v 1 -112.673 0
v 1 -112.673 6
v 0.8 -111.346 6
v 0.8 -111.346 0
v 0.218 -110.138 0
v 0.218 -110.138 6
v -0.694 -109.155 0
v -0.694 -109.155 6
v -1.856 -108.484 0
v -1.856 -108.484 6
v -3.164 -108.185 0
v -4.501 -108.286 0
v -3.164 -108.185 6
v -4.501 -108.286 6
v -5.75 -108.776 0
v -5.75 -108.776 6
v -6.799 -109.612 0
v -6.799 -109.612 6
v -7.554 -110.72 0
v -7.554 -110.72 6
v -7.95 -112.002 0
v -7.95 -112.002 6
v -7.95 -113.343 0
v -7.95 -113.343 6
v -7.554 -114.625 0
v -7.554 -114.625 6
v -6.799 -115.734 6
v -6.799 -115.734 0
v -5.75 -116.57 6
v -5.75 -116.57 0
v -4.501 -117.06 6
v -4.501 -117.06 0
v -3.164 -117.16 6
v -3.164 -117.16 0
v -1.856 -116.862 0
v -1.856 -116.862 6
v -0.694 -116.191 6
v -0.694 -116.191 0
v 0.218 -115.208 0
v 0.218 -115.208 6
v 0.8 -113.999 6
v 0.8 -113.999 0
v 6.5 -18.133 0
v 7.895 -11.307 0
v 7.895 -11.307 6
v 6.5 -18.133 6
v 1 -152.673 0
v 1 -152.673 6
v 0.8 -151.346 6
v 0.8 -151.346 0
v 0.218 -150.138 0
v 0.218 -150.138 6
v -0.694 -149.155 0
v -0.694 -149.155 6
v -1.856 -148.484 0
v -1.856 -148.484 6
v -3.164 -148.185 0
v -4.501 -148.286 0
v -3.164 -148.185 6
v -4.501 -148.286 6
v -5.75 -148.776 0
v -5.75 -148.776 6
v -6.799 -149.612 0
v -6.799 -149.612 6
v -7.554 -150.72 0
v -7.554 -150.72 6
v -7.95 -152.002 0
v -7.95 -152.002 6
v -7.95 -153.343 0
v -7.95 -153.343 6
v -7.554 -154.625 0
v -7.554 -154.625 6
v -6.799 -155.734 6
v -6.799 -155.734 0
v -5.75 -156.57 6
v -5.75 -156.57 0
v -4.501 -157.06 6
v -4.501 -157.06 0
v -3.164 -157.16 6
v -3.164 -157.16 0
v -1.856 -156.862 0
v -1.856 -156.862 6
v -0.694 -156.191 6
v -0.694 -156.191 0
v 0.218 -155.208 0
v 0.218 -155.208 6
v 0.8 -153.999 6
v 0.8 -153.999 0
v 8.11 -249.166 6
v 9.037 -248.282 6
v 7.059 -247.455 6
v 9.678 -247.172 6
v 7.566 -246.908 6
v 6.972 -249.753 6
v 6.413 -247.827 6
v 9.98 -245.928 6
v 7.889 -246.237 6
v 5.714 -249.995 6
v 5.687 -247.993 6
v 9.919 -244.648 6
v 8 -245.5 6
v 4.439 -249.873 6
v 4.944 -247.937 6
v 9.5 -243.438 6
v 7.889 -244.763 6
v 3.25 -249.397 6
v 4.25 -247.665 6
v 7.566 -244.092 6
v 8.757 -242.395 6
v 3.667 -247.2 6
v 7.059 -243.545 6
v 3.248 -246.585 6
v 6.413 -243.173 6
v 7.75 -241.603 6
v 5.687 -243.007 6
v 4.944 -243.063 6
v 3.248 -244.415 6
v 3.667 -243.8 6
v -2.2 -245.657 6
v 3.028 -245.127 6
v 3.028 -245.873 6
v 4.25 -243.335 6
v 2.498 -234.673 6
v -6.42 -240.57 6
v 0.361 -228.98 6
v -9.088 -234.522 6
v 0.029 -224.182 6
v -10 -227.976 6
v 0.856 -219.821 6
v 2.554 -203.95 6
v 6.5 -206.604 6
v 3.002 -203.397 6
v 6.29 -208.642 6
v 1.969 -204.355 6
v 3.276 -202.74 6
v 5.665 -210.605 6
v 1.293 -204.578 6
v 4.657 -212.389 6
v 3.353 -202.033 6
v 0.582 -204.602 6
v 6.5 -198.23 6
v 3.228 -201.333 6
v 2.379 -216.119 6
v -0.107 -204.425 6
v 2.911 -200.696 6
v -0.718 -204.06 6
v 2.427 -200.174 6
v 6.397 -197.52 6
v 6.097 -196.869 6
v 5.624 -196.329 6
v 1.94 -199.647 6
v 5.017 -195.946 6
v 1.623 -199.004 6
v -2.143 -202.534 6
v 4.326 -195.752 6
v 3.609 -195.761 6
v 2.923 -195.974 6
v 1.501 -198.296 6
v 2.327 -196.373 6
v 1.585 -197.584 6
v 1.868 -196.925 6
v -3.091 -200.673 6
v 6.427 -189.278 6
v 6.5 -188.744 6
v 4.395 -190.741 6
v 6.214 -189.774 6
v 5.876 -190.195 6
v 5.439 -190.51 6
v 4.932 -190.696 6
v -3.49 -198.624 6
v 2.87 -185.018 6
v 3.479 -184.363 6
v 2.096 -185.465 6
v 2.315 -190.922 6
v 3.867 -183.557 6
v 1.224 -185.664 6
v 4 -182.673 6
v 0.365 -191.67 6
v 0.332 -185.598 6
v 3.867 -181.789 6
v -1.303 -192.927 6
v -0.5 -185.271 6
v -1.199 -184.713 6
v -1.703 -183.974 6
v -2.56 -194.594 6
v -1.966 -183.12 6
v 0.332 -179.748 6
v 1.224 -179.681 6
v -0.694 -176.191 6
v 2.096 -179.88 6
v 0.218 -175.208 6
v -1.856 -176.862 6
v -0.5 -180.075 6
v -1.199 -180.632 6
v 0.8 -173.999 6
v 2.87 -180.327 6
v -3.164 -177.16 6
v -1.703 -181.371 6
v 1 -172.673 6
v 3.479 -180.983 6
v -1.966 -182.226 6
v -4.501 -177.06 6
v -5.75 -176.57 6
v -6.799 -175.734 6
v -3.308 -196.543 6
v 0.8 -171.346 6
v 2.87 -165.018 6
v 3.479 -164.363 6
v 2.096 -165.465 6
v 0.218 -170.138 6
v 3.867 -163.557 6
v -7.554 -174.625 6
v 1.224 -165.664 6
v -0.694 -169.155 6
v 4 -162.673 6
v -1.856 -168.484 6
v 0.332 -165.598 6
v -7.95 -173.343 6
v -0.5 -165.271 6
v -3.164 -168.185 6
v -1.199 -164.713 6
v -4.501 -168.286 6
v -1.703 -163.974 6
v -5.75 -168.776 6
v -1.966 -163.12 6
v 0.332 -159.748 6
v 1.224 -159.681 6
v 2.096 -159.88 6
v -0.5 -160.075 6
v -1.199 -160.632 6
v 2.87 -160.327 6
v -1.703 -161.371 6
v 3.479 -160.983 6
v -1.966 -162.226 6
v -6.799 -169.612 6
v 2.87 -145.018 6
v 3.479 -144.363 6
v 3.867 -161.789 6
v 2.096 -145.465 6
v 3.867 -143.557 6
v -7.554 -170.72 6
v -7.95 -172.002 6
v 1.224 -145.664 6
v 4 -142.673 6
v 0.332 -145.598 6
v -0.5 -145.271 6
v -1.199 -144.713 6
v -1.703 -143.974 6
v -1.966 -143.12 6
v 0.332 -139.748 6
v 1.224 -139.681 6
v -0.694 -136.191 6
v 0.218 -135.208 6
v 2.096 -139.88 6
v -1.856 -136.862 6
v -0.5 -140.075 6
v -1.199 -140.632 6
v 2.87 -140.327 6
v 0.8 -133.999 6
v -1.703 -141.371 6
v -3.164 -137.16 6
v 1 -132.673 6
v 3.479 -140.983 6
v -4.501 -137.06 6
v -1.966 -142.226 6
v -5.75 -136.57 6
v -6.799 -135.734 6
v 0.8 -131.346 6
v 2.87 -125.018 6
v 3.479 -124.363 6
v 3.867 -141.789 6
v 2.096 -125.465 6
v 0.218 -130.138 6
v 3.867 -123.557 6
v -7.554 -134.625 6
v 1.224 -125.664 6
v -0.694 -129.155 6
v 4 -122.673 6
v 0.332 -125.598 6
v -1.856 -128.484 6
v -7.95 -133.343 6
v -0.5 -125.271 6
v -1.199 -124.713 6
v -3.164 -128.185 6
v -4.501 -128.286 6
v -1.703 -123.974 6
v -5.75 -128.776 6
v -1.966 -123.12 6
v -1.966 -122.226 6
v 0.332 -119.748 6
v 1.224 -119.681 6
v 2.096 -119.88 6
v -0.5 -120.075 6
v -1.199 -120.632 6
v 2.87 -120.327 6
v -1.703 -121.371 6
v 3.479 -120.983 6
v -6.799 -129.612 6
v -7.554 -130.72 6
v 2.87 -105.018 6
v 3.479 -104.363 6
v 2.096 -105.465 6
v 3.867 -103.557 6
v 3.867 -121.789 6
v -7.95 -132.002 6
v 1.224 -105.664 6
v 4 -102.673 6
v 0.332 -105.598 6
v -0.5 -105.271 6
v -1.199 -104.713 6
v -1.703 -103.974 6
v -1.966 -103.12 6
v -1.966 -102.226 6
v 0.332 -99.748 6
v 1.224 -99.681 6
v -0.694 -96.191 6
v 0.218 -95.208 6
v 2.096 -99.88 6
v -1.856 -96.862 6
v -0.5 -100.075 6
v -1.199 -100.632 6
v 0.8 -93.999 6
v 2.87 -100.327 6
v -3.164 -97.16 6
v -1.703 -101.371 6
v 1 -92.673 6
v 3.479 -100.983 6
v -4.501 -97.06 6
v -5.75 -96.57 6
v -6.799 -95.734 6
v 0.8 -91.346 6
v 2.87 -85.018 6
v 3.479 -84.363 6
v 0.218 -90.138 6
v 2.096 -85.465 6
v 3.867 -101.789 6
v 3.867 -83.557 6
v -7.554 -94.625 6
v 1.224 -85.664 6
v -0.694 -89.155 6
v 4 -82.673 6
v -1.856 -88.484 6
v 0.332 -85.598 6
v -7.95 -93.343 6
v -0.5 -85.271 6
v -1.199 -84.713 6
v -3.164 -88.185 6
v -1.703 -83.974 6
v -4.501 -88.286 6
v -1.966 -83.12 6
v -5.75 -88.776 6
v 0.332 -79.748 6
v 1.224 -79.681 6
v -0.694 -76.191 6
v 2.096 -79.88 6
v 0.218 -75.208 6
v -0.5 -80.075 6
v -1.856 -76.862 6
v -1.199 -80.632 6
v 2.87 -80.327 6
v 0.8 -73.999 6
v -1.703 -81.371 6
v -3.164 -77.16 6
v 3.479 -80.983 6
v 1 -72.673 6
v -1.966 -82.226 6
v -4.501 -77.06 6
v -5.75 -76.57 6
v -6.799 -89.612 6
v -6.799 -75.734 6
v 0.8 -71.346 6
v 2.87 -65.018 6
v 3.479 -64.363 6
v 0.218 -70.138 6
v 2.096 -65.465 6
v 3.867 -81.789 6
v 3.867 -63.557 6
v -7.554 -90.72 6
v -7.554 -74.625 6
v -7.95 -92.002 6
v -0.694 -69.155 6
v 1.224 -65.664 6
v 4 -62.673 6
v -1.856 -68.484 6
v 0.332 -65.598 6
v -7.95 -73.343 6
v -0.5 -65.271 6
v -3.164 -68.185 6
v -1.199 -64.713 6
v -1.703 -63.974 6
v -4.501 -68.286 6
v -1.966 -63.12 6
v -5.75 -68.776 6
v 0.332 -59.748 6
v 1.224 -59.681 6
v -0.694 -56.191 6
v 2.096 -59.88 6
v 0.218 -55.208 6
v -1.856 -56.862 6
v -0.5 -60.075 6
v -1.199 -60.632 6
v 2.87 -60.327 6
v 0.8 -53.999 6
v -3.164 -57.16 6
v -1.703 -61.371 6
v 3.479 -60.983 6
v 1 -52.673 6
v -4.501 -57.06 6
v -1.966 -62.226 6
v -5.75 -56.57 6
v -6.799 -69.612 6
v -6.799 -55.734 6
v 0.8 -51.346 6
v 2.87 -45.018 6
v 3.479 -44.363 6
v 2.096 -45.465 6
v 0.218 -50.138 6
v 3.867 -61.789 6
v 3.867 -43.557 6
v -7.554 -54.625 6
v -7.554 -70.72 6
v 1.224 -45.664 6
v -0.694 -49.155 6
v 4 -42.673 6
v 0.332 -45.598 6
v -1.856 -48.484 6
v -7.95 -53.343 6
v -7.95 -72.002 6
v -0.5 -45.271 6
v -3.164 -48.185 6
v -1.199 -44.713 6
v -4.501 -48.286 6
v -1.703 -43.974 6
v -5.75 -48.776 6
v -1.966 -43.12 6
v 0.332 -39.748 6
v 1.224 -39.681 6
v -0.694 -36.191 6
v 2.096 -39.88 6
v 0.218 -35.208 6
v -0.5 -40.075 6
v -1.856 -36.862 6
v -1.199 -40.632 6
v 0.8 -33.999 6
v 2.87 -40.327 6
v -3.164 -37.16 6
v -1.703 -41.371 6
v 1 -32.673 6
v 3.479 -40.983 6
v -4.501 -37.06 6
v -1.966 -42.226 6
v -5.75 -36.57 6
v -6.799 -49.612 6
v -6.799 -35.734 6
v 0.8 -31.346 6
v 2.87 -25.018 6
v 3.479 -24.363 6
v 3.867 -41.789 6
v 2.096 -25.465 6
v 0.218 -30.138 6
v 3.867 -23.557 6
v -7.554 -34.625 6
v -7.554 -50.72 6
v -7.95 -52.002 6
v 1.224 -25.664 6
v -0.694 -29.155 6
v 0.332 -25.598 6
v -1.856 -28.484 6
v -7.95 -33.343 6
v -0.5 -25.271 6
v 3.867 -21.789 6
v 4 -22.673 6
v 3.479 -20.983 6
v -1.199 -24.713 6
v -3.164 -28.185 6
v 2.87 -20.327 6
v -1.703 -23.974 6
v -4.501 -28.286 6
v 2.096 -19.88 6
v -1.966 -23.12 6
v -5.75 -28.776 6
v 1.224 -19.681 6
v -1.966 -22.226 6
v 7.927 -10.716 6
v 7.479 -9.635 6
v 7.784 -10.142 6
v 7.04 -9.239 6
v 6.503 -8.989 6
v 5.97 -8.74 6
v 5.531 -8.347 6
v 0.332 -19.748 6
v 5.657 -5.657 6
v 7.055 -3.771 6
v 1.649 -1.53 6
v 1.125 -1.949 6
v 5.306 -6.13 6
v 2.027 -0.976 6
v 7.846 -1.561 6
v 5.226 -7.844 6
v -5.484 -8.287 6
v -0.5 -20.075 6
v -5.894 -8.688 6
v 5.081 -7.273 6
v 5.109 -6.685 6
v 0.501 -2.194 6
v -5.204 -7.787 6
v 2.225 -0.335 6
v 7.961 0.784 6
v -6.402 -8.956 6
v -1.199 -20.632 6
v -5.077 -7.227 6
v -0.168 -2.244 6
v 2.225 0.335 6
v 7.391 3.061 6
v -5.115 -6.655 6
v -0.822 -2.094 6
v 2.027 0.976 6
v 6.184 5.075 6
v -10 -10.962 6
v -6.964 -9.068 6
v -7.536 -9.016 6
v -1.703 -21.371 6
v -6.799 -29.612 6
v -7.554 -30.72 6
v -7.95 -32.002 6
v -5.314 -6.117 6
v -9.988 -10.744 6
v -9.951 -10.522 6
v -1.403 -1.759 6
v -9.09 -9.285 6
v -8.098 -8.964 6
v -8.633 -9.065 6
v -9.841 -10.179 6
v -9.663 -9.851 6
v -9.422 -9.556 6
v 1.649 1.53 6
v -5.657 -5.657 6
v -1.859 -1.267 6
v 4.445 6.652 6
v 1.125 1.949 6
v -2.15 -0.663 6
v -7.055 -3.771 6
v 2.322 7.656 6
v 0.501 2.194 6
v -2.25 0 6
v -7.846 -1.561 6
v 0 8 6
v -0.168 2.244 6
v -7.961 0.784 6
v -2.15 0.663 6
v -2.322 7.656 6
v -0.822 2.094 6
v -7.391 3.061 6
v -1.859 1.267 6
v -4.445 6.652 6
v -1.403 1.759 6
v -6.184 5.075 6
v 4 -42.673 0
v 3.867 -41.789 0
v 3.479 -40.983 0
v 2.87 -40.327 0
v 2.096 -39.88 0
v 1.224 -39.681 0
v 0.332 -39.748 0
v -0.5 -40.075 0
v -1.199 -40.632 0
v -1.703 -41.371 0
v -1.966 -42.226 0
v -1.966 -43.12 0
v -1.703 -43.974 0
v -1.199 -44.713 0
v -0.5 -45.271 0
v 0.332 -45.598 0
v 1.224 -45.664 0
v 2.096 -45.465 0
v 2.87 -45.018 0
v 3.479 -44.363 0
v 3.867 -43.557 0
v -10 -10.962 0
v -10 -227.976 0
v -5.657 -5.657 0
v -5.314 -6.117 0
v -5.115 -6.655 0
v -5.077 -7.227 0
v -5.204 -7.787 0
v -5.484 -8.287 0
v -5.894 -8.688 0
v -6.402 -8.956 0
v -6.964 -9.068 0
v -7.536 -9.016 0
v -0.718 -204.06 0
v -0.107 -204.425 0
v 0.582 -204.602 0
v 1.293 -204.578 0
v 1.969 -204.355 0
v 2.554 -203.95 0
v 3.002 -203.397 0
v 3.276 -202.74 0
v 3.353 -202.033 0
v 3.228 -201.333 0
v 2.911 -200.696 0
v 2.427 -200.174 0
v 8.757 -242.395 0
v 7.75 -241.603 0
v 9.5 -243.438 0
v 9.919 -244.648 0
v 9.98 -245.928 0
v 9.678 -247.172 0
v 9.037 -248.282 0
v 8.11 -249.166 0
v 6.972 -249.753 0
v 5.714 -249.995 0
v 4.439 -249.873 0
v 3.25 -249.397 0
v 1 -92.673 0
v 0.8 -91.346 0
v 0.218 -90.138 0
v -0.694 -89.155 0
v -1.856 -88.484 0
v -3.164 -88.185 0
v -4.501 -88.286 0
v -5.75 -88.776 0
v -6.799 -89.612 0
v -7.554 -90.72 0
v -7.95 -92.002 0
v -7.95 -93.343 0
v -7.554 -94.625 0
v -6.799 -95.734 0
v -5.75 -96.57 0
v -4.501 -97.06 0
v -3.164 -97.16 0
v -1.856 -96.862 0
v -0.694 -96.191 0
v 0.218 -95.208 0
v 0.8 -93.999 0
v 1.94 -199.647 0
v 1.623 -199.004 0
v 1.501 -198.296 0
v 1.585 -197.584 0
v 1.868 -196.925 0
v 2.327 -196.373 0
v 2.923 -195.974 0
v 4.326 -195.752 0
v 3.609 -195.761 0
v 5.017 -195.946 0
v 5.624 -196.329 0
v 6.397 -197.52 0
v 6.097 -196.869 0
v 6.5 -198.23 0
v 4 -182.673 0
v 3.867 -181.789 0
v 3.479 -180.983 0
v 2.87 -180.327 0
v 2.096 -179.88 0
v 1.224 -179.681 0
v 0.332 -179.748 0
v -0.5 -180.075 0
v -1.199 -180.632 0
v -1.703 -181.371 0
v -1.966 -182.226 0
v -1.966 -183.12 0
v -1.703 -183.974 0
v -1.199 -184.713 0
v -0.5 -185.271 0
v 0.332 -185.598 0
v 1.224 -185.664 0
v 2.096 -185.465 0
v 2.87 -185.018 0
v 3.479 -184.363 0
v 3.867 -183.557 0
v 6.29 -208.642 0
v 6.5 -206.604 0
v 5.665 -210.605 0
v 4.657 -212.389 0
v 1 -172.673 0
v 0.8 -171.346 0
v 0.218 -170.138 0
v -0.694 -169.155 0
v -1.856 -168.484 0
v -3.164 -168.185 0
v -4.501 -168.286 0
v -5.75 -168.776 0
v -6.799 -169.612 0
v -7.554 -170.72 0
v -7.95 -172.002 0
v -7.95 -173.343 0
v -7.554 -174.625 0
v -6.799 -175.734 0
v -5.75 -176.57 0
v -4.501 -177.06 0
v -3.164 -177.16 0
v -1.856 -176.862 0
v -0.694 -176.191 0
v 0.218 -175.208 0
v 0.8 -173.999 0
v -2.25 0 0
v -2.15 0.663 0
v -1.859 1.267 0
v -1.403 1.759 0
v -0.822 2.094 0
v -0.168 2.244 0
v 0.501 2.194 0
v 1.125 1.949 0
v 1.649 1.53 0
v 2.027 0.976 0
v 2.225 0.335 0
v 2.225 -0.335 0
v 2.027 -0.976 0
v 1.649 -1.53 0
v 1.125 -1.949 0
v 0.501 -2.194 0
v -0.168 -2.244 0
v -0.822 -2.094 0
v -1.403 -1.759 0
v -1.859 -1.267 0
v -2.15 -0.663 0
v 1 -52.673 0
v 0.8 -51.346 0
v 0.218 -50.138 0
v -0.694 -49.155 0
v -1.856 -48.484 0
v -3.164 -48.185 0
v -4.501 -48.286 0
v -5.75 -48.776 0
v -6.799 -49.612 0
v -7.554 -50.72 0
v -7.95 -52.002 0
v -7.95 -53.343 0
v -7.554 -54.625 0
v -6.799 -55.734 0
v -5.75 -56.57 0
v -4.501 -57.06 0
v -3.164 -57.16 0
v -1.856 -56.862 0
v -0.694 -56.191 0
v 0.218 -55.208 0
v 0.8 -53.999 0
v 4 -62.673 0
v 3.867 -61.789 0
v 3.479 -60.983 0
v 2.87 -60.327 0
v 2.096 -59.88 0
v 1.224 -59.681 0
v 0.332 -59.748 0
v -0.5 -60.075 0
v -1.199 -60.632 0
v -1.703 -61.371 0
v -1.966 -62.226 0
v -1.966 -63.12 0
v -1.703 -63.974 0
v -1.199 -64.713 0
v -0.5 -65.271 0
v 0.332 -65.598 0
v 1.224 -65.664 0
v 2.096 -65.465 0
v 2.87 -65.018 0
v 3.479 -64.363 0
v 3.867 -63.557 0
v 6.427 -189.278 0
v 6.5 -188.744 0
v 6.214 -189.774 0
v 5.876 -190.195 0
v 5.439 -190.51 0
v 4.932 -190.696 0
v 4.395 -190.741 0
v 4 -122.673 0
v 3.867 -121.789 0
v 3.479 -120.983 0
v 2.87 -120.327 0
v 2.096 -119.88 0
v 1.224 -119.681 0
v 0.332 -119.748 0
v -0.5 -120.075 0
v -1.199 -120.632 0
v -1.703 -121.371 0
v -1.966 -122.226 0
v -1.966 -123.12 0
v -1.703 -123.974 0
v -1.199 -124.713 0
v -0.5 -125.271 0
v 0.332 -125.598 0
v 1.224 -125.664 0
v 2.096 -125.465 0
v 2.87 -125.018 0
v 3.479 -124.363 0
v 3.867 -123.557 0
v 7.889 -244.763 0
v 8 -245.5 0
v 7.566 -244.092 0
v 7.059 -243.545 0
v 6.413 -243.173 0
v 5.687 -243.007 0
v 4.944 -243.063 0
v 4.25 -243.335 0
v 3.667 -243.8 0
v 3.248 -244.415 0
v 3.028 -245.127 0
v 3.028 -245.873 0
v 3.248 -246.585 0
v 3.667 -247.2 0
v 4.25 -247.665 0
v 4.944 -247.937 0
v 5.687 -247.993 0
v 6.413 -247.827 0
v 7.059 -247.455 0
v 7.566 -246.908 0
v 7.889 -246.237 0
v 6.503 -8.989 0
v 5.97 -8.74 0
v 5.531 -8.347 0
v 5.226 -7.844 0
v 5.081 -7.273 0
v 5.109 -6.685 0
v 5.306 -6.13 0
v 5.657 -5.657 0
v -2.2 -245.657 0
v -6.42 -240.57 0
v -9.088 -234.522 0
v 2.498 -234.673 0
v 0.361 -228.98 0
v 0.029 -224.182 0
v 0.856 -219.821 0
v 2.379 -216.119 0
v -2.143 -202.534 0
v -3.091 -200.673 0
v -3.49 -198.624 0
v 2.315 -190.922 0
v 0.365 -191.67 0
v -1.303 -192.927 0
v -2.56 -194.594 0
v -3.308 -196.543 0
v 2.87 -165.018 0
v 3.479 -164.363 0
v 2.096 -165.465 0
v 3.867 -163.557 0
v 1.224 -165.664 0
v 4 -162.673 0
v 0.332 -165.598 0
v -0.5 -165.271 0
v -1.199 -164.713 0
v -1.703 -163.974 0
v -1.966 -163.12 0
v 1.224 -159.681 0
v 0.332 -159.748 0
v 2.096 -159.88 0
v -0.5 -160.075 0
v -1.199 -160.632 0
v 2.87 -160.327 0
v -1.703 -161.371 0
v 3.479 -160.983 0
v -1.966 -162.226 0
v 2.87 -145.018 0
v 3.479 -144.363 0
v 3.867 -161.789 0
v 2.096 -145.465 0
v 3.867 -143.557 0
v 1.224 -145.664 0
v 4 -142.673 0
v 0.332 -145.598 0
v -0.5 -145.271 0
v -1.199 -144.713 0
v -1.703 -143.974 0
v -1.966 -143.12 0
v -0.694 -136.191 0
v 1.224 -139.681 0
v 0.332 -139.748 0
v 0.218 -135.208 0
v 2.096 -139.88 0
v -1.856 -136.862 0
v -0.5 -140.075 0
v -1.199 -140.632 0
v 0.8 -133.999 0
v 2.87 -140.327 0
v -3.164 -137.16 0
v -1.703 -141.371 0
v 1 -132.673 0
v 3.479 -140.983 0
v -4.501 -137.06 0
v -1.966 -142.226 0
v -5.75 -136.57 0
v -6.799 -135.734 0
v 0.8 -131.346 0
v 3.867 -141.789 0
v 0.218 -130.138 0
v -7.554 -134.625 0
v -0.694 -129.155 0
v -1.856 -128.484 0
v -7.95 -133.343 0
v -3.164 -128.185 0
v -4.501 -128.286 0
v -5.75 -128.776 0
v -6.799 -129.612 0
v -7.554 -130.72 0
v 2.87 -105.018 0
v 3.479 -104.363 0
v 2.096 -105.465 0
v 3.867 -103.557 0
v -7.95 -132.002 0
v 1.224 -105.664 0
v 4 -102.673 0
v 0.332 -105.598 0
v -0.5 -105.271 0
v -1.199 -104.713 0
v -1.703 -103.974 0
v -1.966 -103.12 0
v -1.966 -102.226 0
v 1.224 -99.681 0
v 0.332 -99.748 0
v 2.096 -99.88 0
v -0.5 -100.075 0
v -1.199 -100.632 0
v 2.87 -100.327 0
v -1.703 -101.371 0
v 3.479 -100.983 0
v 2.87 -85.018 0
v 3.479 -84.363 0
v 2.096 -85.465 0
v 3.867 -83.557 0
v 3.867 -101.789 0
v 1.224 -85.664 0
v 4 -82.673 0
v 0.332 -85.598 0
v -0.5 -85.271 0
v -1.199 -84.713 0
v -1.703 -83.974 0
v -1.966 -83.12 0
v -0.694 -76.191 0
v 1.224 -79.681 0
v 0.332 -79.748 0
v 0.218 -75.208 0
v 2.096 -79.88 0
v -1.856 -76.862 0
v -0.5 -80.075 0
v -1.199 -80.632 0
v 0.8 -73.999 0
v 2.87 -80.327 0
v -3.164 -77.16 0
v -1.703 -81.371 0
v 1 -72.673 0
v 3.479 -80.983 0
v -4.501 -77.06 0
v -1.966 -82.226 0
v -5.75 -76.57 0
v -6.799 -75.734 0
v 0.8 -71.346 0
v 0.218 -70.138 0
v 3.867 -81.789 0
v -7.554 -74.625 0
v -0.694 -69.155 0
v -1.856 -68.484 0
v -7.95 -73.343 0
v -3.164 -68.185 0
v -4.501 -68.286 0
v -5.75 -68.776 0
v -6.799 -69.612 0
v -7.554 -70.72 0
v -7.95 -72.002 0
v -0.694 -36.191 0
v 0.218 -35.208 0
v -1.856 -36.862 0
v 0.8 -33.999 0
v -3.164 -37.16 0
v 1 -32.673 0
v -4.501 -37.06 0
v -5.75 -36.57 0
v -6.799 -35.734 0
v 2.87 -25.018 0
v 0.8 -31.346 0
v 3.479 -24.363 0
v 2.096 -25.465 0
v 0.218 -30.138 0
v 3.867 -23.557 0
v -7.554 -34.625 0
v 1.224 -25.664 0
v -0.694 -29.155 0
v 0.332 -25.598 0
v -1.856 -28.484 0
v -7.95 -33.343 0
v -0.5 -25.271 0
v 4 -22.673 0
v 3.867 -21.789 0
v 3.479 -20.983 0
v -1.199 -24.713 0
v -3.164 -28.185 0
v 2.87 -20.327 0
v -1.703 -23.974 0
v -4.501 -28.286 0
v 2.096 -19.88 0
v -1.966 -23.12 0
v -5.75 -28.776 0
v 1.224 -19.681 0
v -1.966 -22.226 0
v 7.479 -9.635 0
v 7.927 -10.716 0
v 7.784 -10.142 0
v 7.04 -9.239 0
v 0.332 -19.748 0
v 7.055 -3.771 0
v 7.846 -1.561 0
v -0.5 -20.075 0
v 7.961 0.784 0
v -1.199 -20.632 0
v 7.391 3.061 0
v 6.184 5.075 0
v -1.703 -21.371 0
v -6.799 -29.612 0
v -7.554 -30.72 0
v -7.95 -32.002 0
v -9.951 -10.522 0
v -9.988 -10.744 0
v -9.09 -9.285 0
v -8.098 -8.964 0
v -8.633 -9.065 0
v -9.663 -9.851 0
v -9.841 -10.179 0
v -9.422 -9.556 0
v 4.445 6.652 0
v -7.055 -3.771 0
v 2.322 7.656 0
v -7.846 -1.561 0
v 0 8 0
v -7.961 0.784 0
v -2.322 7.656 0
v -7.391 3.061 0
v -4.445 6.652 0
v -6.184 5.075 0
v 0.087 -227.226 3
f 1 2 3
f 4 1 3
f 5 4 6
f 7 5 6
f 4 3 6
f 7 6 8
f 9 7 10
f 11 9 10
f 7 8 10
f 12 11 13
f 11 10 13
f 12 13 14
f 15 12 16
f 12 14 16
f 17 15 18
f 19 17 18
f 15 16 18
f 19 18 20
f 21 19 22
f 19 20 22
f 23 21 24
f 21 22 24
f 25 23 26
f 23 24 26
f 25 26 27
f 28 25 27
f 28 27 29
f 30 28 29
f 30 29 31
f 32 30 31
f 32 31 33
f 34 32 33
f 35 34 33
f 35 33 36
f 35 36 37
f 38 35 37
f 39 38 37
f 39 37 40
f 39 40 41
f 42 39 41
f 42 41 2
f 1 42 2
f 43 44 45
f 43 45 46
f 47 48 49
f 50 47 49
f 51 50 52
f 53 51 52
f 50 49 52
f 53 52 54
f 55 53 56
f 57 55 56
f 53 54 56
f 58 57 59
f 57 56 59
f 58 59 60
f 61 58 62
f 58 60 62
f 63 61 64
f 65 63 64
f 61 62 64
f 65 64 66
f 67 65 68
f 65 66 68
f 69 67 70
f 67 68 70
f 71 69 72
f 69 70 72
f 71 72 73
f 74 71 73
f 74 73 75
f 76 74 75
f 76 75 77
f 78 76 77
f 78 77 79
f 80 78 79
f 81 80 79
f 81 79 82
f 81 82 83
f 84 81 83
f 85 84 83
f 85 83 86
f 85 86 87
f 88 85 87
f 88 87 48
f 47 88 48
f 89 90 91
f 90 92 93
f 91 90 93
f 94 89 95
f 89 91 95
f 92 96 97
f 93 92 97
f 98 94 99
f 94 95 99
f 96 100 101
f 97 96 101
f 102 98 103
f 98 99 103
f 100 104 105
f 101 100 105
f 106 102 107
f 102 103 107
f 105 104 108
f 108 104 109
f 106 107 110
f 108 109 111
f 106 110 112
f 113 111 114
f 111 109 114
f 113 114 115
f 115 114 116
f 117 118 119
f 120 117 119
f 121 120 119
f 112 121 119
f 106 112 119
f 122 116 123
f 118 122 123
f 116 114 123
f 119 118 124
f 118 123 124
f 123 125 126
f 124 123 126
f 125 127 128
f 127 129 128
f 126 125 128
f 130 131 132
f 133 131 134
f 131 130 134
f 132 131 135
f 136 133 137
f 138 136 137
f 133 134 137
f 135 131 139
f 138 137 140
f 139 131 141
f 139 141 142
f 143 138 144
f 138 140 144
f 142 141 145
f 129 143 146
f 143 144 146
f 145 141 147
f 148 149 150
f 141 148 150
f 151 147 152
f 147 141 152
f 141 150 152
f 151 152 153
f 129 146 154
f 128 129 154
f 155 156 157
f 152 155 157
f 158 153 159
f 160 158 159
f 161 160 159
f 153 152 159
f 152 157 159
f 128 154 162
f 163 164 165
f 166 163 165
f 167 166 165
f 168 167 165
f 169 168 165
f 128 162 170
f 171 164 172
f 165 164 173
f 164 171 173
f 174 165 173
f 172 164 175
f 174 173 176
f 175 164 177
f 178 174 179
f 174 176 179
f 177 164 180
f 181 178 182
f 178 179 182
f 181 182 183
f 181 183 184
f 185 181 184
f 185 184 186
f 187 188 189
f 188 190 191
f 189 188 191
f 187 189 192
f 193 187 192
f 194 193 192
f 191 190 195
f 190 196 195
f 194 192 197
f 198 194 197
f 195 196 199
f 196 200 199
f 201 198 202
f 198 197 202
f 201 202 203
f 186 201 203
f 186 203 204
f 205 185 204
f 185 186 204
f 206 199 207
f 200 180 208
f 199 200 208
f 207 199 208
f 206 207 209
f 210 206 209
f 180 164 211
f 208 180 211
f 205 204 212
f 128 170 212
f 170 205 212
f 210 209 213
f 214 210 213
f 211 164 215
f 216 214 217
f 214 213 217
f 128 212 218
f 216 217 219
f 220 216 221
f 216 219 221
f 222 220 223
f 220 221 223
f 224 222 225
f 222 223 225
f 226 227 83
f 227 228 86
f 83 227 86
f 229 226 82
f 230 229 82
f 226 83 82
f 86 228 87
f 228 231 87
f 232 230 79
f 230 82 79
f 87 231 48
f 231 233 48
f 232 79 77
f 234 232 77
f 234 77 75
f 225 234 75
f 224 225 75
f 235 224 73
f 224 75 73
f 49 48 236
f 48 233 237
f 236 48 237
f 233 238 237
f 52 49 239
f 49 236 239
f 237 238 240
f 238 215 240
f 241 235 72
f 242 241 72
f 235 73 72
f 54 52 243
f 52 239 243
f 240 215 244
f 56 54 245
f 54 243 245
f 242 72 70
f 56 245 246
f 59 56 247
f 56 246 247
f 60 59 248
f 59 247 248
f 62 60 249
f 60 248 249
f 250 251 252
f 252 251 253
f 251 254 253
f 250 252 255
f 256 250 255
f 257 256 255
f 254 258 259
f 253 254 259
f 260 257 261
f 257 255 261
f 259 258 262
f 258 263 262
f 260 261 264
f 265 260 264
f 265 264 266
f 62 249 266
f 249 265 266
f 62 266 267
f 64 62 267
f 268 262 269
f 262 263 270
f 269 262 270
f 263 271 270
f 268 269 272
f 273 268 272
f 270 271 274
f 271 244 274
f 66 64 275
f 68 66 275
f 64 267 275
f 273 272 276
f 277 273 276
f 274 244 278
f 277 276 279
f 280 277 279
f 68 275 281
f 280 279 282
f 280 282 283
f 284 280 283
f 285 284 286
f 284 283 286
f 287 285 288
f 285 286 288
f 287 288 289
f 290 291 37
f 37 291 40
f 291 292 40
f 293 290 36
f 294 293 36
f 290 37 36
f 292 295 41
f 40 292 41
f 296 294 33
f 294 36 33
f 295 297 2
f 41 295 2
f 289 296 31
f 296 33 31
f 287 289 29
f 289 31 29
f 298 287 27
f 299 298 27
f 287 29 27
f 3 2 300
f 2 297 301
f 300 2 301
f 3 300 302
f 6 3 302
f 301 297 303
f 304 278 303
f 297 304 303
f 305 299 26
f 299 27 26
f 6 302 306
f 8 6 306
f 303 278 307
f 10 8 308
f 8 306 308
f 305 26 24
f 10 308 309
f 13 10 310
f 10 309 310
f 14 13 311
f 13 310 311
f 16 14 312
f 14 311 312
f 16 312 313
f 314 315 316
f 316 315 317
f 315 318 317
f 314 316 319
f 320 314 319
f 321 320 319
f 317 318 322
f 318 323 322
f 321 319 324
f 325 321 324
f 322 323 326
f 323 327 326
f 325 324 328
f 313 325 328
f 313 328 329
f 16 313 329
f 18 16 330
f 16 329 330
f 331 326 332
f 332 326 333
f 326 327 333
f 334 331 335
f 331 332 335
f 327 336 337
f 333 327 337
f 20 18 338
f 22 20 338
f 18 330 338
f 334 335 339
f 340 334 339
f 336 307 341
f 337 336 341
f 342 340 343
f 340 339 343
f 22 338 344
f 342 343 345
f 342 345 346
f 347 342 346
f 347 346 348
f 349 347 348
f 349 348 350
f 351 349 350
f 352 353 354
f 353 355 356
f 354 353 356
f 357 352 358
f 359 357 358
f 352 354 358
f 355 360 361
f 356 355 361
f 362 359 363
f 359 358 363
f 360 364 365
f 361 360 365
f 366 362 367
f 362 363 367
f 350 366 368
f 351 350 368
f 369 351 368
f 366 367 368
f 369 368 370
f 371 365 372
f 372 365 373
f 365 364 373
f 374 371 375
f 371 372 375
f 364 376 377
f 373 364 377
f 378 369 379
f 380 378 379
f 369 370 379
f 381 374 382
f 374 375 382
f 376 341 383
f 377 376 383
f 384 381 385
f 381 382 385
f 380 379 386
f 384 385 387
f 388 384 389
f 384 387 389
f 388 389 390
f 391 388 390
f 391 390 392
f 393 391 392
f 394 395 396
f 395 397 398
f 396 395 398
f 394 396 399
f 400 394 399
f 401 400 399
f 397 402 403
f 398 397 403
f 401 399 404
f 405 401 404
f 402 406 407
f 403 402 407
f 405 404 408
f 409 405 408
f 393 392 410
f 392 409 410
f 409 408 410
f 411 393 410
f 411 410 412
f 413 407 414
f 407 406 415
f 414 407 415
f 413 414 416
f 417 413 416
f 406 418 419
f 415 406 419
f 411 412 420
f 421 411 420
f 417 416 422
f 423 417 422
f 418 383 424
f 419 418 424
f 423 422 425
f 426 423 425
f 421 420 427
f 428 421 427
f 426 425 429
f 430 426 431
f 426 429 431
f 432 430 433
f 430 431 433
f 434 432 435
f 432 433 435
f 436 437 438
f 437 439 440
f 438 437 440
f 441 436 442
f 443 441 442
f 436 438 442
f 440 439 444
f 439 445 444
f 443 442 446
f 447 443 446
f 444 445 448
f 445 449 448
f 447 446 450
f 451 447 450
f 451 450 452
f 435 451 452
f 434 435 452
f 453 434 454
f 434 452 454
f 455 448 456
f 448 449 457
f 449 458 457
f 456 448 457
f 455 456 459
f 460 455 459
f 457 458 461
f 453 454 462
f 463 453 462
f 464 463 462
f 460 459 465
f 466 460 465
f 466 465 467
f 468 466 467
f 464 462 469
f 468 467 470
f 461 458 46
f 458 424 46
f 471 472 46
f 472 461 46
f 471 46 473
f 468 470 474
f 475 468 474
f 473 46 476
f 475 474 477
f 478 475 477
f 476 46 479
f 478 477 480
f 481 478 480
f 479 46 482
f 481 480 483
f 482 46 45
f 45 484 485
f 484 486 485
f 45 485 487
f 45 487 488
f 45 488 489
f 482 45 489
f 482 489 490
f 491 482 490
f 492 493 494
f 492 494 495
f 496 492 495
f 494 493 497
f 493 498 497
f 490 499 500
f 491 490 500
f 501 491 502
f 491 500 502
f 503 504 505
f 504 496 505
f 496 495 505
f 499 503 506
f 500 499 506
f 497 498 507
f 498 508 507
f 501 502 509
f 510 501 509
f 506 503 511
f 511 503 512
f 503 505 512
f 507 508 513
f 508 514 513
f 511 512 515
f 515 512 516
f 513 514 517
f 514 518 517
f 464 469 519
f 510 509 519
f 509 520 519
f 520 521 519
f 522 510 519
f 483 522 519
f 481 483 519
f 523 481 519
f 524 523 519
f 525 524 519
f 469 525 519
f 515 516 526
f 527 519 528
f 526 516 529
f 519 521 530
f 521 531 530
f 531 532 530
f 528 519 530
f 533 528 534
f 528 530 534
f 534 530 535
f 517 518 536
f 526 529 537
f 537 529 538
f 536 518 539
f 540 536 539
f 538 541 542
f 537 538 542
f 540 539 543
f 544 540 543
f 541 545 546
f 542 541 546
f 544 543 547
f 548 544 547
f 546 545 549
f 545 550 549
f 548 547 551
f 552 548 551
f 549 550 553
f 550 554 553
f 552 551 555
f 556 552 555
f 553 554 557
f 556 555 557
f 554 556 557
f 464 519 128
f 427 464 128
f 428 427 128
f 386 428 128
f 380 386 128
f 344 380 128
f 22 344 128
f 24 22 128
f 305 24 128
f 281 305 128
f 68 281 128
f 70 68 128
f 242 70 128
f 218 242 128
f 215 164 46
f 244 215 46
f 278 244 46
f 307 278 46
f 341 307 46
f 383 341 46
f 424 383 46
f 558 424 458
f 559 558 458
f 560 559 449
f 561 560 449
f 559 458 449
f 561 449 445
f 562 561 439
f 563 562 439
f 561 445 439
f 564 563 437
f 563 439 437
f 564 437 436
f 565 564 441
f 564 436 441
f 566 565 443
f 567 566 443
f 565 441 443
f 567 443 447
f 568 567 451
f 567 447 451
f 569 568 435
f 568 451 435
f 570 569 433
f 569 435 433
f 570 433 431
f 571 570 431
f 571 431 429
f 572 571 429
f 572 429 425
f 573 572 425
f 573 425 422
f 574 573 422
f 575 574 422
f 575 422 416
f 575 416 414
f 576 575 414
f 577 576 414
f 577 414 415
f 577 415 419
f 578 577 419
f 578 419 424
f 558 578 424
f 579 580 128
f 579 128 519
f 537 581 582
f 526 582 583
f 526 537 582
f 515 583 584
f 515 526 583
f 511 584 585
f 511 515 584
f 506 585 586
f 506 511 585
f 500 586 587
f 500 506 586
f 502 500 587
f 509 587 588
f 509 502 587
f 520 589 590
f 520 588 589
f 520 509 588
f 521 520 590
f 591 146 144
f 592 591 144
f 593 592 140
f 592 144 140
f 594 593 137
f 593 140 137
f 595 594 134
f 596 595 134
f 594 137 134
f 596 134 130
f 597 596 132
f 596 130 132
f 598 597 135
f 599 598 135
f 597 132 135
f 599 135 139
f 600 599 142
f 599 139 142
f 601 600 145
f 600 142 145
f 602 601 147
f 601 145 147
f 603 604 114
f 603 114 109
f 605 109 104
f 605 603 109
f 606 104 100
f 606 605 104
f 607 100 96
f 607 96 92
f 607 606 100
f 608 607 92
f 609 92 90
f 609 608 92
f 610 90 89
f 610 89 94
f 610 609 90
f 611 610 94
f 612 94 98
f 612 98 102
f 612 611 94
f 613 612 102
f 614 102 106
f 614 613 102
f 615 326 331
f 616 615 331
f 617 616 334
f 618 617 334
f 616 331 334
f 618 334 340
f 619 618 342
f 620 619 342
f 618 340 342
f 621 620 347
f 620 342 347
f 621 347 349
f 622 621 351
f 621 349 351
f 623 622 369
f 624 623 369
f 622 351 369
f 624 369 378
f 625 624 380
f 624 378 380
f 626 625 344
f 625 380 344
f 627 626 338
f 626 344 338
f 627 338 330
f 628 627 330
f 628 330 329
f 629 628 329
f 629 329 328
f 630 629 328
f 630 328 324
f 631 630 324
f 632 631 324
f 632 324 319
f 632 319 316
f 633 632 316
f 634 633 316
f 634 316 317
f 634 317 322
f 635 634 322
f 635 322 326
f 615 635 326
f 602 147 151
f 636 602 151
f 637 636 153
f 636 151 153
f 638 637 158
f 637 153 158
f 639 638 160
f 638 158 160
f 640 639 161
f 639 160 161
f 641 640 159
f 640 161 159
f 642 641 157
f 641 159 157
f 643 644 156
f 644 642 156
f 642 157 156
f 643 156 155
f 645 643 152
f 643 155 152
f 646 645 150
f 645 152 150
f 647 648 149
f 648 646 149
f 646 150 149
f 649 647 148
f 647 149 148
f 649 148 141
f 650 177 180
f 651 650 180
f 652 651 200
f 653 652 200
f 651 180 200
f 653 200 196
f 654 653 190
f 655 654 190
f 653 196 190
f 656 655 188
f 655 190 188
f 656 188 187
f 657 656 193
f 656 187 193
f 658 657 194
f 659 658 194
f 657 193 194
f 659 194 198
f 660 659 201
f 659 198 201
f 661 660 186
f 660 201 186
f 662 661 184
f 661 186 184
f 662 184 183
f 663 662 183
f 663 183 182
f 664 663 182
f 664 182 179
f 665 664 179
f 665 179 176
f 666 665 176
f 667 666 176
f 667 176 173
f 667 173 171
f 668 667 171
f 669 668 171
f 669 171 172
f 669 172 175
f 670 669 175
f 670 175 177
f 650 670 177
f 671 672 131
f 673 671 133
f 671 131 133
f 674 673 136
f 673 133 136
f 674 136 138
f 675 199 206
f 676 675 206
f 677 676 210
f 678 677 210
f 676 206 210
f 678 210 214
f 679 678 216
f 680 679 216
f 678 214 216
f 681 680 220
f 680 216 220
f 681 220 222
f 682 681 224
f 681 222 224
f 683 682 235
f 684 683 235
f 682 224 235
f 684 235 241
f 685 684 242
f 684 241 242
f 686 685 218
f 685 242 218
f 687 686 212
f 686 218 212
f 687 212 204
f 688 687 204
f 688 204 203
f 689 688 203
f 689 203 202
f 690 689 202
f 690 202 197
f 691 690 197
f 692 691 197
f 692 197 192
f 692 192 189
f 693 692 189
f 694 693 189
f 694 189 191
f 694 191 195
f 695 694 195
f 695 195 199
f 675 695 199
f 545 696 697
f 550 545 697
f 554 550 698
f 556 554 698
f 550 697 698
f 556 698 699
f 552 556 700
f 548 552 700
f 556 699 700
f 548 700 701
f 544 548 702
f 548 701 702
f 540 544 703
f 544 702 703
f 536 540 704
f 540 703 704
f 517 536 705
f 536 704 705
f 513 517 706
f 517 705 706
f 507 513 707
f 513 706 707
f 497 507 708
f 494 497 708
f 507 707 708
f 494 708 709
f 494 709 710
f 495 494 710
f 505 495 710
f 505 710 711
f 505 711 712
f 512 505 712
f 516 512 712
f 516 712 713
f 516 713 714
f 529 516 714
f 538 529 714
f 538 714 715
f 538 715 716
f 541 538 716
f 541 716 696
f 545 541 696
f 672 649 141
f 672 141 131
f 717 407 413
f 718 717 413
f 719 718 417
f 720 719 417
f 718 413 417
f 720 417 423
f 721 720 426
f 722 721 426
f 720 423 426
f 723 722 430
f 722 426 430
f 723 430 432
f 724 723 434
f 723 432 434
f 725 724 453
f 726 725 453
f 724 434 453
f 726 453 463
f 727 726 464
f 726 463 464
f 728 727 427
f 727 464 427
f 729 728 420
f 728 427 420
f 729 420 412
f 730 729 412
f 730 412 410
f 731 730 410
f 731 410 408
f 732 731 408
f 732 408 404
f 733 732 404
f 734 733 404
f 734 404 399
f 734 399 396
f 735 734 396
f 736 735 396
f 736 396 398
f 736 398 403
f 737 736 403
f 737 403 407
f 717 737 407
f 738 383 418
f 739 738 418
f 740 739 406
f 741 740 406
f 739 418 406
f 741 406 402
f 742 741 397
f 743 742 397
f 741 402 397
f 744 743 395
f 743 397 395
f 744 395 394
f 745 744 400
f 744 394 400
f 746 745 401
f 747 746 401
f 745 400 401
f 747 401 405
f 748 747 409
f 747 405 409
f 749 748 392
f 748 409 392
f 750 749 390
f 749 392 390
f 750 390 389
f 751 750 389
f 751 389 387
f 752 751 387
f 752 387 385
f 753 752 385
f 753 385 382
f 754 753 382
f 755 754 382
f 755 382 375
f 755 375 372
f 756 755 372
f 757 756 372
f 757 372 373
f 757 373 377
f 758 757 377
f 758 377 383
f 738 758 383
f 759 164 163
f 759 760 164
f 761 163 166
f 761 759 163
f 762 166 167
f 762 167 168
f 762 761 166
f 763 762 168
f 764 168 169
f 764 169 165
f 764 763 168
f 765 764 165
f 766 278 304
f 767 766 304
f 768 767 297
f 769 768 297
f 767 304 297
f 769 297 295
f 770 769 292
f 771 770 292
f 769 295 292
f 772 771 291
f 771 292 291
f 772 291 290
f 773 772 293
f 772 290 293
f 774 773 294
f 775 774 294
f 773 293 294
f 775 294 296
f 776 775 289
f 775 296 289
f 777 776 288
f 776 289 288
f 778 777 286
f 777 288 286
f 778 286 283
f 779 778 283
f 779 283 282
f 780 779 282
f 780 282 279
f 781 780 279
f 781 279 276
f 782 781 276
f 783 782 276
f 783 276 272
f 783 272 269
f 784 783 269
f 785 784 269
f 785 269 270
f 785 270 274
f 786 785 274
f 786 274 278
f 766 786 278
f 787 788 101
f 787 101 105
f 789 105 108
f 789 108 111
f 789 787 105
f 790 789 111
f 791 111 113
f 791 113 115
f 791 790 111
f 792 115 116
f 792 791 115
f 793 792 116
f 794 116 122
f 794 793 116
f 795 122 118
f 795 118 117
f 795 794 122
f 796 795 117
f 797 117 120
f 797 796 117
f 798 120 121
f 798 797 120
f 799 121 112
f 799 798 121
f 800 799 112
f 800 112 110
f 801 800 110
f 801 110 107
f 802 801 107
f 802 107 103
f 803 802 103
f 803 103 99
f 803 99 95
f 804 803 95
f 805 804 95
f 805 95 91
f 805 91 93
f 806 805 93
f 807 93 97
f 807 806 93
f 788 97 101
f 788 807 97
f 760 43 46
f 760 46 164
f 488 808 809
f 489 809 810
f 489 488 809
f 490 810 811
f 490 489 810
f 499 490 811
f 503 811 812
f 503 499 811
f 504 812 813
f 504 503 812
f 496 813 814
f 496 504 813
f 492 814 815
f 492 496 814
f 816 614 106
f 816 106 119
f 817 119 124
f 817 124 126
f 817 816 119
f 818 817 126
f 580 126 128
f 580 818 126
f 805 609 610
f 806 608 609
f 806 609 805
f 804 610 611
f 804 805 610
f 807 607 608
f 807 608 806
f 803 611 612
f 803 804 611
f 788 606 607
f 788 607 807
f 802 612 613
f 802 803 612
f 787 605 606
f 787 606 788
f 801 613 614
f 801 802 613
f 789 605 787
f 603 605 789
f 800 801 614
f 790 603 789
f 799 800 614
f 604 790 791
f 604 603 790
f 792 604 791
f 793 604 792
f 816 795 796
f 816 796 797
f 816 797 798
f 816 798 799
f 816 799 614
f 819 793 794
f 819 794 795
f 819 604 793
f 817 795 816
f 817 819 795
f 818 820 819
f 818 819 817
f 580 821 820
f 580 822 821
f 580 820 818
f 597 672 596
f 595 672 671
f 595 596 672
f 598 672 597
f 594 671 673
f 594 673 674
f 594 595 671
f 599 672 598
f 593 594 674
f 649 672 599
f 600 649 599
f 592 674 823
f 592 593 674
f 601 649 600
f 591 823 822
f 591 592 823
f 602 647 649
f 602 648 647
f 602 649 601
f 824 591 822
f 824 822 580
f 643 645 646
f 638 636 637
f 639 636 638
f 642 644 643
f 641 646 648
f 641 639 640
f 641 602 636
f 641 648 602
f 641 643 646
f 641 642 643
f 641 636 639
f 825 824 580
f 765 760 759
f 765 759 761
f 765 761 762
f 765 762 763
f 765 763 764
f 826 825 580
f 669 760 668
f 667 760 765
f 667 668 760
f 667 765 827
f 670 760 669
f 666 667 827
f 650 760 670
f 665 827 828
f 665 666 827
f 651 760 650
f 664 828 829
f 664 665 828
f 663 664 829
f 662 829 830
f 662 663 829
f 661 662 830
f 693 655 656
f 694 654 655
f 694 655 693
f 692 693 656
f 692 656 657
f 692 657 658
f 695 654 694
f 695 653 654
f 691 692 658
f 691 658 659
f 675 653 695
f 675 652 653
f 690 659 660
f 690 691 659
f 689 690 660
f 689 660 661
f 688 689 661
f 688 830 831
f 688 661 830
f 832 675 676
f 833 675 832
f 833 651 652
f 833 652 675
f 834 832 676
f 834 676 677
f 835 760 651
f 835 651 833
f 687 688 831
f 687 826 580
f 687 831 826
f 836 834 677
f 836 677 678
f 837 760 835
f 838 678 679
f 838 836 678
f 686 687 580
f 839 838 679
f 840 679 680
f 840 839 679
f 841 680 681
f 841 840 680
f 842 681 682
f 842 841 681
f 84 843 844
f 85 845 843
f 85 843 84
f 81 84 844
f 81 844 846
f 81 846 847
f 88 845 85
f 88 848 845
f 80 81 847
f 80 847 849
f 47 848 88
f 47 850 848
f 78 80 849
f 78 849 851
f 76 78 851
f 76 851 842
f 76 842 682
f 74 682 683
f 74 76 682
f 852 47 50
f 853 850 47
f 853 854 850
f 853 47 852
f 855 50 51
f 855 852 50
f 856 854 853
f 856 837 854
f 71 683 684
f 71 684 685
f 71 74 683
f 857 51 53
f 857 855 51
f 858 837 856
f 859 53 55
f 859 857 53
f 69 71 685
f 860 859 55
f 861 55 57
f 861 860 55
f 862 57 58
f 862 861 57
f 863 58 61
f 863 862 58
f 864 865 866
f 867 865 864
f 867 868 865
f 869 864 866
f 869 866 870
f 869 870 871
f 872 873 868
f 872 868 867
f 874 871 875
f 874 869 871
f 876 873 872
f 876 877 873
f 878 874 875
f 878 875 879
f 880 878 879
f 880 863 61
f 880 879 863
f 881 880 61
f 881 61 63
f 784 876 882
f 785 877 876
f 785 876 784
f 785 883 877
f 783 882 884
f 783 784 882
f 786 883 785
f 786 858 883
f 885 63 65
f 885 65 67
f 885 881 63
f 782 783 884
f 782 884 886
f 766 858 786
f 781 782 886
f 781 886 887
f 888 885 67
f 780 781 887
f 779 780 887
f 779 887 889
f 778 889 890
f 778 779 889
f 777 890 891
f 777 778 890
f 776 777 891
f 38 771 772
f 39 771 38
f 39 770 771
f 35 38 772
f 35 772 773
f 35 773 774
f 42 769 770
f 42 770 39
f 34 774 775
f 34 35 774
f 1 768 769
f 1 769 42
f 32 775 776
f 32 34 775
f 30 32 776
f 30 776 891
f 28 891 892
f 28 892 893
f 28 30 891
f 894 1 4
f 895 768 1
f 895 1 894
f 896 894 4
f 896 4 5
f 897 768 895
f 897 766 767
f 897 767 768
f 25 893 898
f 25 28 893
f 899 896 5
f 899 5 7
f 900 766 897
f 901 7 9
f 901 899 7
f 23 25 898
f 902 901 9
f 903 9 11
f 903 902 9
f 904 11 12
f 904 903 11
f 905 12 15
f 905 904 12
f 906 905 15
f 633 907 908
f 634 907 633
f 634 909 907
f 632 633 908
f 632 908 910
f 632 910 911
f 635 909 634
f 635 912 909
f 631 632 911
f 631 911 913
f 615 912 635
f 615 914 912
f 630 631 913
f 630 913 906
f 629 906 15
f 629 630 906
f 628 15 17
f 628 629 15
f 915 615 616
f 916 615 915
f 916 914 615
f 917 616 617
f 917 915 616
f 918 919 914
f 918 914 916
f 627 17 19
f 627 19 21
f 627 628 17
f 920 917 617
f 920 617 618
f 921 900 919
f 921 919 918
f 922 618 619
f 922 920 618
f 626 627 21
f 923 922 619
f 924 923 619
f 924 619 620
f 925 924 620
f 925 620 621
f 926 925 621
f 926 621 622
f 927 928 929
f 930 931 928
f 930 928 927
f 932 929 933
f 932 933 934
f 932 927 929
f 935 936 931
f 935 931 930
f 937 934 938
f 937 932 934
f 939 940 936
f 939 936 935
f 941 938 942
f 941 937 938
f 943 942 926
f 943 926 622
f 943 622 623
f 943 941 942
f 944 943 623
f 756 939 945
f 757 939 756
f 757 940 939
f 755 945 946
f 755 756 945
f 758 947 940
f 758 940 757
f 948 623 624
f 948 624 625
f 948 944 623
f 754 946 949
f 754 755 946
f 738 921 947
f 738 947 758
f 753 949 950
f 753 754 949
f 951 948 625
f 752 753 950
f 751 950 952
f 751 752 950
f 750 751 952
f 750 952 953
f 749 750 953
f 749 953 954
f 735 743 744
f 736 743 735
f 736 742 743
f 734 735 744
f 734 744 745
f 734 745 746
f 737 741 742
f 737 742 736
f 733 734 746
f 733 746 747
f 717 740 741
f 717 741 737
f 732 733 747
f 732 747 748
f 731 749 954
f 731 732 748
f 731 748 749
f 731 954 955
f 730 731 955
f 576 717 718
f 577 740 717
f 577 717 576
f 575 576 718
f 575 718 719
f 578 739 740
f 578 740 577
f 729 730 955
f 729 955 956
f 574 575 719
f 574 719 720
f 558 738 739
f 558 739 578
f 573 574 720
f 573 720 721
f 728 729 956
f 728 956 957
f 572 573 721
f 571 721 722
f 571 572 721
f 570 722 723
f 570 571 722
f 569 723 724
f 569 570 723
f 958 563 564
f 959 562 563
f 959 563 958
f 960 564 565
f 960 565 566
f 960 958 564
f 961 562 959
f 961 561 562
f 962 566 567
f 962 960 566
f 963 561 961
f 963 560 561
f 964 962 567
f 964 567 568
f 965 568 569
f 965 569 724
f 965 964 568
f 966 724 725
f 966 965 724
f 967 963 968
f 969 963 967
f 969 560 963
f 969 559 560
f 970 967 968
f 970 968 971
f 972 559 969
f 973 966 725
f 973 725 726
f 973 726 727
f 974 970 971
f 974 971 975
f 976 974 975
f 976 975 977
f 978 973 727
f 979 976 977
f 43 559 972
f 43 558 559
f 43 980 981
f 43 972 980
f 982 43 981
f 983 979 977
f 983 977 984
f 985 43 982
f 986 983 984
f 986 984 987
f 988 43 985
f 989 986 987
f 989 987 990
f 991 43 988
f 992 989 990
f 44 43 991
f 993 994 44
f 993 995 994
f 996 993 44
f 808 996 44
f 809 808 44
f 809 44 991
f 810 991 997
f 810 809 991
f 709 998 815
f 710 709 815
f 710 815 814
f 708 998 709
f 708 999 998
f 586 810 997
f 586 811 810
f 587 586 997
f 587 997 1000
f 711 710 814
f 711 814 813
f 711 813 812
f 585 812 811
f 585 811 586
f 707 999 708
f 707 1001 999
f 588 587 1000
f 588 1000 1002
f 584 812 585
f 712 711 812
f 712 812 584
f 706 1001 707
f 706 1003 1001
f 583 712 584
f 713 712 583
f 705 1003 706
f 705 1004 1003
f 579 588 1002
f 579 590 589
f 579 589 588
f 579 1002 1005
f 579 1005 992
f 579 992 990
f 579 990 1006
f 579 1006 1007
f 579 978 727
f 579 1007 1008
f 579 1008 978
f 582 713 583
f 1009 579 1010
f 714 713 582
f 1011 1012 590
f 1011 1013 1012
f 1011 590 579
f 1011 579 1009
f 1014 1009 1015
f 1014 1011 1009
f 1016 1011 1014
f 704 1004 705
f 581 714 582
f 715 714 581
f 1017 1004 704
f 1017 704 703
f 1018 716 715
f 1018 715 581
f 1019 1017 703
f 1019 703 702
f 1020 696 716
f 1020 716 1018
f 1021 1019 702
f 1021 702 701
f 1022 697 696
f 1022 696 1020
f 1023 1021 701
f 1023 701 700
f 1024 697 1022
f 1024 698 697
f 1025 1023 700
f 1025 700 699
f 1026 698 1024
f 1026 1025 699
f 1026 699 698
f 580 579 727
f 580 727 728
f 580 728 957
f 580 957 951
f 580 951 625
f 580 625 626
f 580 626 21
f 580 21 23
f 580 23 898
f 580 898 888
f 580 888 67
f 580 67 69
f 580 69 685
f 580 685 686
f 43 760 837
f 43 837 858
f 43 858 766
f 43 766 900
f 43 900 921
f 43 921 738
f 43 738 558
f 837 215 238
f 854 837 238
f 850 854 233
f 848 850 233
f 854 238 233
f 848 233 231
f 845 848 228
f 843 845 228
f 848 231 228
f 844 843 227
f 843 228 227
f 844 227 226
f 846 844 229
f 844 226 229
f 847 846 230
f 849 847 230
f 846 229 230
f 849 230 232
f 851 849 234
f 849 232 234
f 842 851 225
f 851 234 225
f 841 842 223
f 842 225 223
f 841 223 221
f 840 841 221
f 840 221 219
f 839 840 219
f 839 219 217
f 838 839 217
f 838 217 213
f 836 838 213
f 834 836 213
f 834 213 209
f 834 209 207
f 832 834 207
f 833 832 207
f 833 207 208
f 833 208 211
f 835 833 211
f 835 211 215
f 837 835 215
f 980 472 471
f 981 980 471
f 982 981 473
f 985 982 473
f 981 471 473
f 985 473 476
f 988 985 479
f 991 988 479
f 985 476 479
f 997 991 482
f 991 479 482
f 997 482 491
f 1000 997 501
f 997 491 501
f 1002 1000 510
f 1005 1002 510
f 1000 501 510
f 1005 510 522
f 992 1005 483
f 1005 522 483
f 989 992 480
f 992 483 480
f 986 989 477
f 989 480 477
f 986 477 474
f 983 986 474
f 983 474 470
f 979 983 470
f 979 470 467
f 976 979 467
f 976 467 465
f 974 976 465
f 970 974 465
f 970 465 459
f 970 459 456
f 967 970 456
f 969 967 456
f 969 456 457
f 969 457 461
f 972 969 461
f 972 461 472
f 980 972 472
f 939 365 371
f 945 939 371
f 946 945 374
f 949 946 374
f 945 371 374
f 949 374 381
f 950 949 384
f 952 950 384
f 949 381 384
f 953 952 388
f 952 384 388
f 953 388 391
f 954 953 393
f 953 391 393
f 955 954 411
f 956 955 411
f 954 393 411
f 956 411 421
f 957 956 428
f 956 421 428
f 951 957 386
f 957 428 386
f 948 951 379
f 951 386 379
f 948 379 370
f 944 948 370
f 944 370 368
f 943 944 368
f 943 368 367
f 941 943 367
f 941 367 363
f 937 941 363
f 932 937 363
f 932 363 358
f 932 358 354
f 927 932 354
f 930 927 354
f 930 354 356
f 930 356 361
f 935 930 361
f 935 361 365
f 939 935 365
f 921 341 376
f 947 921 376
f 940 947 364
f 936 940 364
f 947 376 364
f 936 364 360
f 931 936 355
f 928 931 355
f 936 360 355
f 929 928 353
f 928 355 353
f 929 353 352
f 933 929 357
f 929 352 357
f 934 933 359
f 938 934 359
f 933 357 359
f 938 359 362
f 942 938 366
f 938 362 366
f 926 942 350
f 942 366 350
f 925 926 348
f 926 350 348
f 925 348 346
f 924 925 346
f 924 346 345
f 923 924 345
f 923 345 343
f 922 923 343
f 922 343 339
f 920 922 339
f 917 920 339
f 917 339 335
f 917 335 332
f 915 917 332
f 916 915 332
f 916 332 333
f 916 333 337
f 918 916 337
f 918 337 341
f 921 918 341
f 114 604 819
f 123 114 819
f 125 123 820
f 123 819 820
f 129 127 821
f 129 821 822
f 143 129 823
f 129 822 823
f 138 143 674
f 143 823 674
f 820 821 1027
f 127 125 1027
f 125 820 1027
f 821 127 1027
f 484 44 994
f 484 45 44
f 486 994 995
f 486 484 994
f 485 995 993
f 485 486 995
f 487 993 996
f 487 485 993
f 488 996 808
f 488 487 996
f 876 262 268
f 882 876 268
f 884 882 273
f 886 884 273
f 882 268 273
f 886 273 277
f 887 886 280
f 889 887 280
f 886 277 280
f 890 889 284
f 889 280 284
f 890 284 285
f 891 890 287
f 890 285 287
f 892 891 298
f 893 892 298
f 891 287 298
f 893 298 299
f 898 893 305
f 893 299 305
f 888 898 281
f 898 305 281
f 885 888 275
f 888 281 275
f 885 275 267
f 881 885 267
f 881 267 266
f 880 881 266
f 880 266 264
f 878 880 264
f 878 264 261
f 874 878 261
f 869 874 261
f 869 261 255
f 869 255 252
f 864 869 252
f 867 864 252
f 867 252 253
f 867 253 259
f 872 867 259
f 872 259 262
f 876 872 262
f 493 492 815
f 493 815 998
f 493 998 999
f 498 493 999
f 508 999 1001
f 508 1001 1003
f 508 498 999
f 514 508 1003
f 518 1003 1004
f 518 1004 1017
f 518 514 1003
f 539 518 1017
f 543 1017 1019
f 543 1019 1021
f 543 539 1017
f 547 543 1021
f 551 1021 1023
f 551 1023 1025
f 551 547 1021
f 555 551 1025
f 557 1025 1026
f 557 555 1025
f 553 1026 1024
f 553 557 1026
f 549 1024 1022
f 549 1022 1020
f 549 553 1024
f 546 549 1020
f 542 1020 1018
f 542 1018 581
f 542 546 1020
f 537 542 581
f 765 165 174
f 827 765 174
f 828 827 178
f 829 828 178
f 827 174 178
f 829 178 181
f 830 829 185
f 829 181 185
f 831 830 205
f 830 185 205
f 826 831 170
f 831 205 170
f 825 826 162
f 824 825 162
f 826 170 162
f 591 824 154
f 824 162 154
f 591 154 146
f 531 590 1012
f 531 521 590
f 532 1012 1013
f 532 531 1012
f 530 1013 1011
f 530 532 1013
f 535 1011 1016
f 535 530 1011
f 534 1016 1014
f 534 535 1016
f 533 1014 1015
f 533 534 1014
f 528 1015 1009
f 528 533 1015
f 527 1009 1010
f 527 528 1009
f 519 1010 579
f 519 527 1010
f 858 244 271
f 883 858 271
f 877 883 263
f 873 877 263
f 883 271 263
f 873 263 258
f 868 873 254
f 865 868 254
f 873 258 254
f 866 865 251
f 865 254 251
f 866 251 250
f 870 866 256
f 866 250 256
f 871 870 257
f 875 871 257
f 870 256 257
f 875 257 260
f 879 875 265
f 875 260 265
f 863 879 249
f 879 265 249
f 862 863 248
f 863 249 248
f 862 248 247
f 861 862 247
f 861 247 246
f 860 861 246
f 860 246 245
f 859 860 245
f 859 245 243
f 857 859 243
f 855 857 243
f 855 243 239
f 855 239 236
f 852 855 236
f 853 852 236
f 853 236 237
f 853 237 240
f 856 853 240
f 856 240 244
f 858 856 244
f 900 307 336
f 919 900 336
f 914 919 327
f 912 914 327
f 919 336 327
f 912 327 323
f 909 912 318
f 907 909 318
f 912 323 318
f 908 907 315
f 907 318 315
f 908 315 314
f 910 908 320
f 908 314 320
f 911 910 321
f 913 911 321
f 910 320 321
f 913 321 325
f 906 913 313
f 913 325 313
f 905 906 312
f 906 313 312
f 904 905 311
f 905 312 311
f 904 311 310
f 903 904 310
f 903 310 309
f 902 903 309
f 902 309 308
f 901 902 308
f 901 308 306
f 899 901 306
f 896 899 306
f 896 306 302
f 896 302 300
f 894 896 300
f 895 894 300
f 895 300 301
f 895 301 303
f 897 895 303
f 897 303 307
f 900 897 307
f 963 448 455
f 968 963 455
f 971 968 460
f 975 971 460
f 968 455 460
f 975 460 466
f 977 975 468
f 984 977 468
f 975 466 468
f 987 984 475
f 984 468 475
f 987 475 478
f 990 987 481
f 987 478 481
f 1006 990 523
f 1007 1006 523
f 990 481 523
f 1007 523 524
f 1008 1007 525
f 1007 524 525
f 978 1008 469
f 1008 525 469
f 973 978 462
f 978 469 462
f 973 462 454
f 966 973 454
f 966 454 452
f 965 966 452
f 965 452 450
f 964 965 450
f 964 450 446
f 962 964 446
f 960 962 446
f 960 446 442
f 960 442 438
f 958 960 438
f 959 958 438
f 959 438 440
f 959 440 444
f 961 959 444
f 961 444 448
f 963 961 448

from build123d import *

# Parameters (mm, degrees)
SKETCH_1_R          = 2.5
EXTRUDE_1_DEPTH     = 6
CUT_EXTRUDE_1_DEPTH = 7.0000001
HOLE_WIZARD_M41_D   = 4.5
CUT_EXTRUDE_2_DEPTH = 7.0000001
FILLET_1_R          = 2
SKETCH_9_R          = 3
SKETCH_9_R_2        = 4.5
CUT_EXTRUDE_4_DEPTH = 7.0000001
FILLET_4_R          = 2
FILLET_5_R          = 10


with BuildPart() as part:
    # Эскиз1 → Бобышка-Вытянуть1 (new body)
    with BuildSketch(Plane.XY):
        with BuildLine():
            Line((6.5, -18.132817334), (6.5, -210))
            add(Edge.make_bspline(
                [(7.75, -241.602885683), (-7.119806504, -226.33675702), (6.5, -210)],
                knots=[0, 0, 0, 1, 1, 1], degree=2))
            ThreePointArc((7.75, -241.602885683), (9.397114317, -247.75), (3.25, -249.397114317))
            ThreePointArc((3.25, -249.397114317), (-6.419807766, -240.569690394), (-10, -227.975611669))
            Line((-10, -227.975611669), (-10, 0))
            ThreePointArc((-10, 0), (1.006528746, 9.949216044), (9.797379977, -2.002834391))
            Line((9.797379977, -2.002834391), (6.5, -18.132817334))
        make_face()
        with Locations((5.5, -245.5)):
            Circle(SKETCH_1_R, mode=Mode.SUBTRACT)
    extrude(amount=EXTRUDE_1_DEPTH)

    # Эскиз2 → Вырез-Вытянуть1 (cut, through all)
    with BuildSketch(Plane.XY.offset(6)):
        with BuildLine():
            Line((6.5, -198.230414456), (6.5, -191.159346644))
            ThreePointArc((6.5, -191.159346644), (-2.545169709, -194.568344894), (-0.718217458, -204.060373635))
            ThreePointArc((-0.718217458, -204.060373635), (2.797841421, -203.689793061), (2.427260847, -200.173734182))
            ThreePointArc((2.427260847, -200.173734182), (2.923396053, -195.974106866), (6.5, -198.230414456))
        make_face()
    extrude(amount=-CUT_EXTRUDE_1_DEPTH, mode=Mode.SUBTRACT)

    # Отверстие с зазором M41 (through all)
    with Locations(Plane.XY.offset(6)):
        with Locations((0, 0)):
            Hole(HOLE_WIZARD_M41_D / 2)

    # Эскиз6 → Вырез-Вытянуть2 (cut, through all)
    with BuildSketch(Plane.XY.offset(6)):
        with BuildLine():
            ThreePointArc((5.656854249, -5.656854249), (0, 8), (-5.656854249, -5.656854249))
            ThreePointArc((-5.656854249, -5.656854249), (-5.656854249, -8.485281374), (-8.485281374, -8.485281374))
            ThreePointArc((-8.485281374, -8.485281374), (0, 12), (8.485281374, -8.485281374))
            ThreePointArc((8.485281374, -8.485281374), (5.656854249, -8.485281374), (5.656854249, -5.656854249))
        make_face()
    extrude(amount=-CUT_EXTRUDE_2_DEPTH, mode=Mode.SUBTRACT)

    # Скругление1
    fillet_1_edges = [part.edges().sort_by_distance(p)[0] for p in [
        (8.468890039, -8.501484892, 3),
        (-10, -6.633249581, 3),
    ]]
    fillet(fillet_1_edges, radius=FILLET_1_R)

    # Эскиз9 → Вырез-Вытянуть4 (cut, through all)
    with BuildSketch(Plane.XY.offset(6)):
        with Locations((1, -22.672779762)):
            Circle(SKETCH_9_R)
        with Locations((1, -42.672779762)):
            Circle(SKETCH_9_R)
        with Locations((1, -62.672779762)):
            Circle(SKETCH_9_R)
        with Locations((1, -82.672779762)):
            Circle(SKETCH_9_R)
        with Locations((1, -102.672779762)):
            Circle(SKETCH_9_R)
        with Locations((1, -122.672779762)):
            Circle(SKETCH_9_R)
        with Locations((1, -142.672779762)):
            Circle(SKETCH_9_R)
        with Locations((1, -162.672779762)):
            Circle(SKETCH_9_R)
        with Locations((1, -182.672779762)):
            Circle(SKETCH_9_R)
        with Locations((-3.5, -32.672779762)):
            Circle(SKETCH_9_R_2)
        with Locations((-3.5, -52.672779762)):
            Circle(SKETCH_9_R_2)
        with Locations((-3.5, -72.672779762)):
            Circle(SKETCH_9_R_2)
        with Locations((-3.5, -92.672779762)):
            Circle(SKETCH_9_R_2)
        with Locations((-3.5, -112.672779762)):
            Circle(SKETCH_9_R_2)
        with Locations((-3.5, -132.672779762)):
            Circle(SKETCH_9_R_2)
        with Locations((-3.5, -152.672779762)):
            Circle(SKETCH_9_R_2)
        with Locations((-3.5, -172.672779762)):
            Circle(SKETCH_9_R_2)
    extrude(amount=-CUT_EXTRUDE_4_DEPTH, mode=Mode.SUBTRACT)

    # Скругление4
    fillet_4_edges = [part.edges().sort_by_distance(p)[0] for p in [
        (6.5, -191.159346644, 3),
    ]]
    fillet(fillet_4_edges, radius=FILLET_4_R)

    # Скругление5
    fillet_5_edges = [part.edges().sort_by_distance(p)[0] for p in [
        (6.5, -210, 3),
    ]]
    fillet(fillet_5_edges, radius=FILLET_5_R)


solid = part.part
